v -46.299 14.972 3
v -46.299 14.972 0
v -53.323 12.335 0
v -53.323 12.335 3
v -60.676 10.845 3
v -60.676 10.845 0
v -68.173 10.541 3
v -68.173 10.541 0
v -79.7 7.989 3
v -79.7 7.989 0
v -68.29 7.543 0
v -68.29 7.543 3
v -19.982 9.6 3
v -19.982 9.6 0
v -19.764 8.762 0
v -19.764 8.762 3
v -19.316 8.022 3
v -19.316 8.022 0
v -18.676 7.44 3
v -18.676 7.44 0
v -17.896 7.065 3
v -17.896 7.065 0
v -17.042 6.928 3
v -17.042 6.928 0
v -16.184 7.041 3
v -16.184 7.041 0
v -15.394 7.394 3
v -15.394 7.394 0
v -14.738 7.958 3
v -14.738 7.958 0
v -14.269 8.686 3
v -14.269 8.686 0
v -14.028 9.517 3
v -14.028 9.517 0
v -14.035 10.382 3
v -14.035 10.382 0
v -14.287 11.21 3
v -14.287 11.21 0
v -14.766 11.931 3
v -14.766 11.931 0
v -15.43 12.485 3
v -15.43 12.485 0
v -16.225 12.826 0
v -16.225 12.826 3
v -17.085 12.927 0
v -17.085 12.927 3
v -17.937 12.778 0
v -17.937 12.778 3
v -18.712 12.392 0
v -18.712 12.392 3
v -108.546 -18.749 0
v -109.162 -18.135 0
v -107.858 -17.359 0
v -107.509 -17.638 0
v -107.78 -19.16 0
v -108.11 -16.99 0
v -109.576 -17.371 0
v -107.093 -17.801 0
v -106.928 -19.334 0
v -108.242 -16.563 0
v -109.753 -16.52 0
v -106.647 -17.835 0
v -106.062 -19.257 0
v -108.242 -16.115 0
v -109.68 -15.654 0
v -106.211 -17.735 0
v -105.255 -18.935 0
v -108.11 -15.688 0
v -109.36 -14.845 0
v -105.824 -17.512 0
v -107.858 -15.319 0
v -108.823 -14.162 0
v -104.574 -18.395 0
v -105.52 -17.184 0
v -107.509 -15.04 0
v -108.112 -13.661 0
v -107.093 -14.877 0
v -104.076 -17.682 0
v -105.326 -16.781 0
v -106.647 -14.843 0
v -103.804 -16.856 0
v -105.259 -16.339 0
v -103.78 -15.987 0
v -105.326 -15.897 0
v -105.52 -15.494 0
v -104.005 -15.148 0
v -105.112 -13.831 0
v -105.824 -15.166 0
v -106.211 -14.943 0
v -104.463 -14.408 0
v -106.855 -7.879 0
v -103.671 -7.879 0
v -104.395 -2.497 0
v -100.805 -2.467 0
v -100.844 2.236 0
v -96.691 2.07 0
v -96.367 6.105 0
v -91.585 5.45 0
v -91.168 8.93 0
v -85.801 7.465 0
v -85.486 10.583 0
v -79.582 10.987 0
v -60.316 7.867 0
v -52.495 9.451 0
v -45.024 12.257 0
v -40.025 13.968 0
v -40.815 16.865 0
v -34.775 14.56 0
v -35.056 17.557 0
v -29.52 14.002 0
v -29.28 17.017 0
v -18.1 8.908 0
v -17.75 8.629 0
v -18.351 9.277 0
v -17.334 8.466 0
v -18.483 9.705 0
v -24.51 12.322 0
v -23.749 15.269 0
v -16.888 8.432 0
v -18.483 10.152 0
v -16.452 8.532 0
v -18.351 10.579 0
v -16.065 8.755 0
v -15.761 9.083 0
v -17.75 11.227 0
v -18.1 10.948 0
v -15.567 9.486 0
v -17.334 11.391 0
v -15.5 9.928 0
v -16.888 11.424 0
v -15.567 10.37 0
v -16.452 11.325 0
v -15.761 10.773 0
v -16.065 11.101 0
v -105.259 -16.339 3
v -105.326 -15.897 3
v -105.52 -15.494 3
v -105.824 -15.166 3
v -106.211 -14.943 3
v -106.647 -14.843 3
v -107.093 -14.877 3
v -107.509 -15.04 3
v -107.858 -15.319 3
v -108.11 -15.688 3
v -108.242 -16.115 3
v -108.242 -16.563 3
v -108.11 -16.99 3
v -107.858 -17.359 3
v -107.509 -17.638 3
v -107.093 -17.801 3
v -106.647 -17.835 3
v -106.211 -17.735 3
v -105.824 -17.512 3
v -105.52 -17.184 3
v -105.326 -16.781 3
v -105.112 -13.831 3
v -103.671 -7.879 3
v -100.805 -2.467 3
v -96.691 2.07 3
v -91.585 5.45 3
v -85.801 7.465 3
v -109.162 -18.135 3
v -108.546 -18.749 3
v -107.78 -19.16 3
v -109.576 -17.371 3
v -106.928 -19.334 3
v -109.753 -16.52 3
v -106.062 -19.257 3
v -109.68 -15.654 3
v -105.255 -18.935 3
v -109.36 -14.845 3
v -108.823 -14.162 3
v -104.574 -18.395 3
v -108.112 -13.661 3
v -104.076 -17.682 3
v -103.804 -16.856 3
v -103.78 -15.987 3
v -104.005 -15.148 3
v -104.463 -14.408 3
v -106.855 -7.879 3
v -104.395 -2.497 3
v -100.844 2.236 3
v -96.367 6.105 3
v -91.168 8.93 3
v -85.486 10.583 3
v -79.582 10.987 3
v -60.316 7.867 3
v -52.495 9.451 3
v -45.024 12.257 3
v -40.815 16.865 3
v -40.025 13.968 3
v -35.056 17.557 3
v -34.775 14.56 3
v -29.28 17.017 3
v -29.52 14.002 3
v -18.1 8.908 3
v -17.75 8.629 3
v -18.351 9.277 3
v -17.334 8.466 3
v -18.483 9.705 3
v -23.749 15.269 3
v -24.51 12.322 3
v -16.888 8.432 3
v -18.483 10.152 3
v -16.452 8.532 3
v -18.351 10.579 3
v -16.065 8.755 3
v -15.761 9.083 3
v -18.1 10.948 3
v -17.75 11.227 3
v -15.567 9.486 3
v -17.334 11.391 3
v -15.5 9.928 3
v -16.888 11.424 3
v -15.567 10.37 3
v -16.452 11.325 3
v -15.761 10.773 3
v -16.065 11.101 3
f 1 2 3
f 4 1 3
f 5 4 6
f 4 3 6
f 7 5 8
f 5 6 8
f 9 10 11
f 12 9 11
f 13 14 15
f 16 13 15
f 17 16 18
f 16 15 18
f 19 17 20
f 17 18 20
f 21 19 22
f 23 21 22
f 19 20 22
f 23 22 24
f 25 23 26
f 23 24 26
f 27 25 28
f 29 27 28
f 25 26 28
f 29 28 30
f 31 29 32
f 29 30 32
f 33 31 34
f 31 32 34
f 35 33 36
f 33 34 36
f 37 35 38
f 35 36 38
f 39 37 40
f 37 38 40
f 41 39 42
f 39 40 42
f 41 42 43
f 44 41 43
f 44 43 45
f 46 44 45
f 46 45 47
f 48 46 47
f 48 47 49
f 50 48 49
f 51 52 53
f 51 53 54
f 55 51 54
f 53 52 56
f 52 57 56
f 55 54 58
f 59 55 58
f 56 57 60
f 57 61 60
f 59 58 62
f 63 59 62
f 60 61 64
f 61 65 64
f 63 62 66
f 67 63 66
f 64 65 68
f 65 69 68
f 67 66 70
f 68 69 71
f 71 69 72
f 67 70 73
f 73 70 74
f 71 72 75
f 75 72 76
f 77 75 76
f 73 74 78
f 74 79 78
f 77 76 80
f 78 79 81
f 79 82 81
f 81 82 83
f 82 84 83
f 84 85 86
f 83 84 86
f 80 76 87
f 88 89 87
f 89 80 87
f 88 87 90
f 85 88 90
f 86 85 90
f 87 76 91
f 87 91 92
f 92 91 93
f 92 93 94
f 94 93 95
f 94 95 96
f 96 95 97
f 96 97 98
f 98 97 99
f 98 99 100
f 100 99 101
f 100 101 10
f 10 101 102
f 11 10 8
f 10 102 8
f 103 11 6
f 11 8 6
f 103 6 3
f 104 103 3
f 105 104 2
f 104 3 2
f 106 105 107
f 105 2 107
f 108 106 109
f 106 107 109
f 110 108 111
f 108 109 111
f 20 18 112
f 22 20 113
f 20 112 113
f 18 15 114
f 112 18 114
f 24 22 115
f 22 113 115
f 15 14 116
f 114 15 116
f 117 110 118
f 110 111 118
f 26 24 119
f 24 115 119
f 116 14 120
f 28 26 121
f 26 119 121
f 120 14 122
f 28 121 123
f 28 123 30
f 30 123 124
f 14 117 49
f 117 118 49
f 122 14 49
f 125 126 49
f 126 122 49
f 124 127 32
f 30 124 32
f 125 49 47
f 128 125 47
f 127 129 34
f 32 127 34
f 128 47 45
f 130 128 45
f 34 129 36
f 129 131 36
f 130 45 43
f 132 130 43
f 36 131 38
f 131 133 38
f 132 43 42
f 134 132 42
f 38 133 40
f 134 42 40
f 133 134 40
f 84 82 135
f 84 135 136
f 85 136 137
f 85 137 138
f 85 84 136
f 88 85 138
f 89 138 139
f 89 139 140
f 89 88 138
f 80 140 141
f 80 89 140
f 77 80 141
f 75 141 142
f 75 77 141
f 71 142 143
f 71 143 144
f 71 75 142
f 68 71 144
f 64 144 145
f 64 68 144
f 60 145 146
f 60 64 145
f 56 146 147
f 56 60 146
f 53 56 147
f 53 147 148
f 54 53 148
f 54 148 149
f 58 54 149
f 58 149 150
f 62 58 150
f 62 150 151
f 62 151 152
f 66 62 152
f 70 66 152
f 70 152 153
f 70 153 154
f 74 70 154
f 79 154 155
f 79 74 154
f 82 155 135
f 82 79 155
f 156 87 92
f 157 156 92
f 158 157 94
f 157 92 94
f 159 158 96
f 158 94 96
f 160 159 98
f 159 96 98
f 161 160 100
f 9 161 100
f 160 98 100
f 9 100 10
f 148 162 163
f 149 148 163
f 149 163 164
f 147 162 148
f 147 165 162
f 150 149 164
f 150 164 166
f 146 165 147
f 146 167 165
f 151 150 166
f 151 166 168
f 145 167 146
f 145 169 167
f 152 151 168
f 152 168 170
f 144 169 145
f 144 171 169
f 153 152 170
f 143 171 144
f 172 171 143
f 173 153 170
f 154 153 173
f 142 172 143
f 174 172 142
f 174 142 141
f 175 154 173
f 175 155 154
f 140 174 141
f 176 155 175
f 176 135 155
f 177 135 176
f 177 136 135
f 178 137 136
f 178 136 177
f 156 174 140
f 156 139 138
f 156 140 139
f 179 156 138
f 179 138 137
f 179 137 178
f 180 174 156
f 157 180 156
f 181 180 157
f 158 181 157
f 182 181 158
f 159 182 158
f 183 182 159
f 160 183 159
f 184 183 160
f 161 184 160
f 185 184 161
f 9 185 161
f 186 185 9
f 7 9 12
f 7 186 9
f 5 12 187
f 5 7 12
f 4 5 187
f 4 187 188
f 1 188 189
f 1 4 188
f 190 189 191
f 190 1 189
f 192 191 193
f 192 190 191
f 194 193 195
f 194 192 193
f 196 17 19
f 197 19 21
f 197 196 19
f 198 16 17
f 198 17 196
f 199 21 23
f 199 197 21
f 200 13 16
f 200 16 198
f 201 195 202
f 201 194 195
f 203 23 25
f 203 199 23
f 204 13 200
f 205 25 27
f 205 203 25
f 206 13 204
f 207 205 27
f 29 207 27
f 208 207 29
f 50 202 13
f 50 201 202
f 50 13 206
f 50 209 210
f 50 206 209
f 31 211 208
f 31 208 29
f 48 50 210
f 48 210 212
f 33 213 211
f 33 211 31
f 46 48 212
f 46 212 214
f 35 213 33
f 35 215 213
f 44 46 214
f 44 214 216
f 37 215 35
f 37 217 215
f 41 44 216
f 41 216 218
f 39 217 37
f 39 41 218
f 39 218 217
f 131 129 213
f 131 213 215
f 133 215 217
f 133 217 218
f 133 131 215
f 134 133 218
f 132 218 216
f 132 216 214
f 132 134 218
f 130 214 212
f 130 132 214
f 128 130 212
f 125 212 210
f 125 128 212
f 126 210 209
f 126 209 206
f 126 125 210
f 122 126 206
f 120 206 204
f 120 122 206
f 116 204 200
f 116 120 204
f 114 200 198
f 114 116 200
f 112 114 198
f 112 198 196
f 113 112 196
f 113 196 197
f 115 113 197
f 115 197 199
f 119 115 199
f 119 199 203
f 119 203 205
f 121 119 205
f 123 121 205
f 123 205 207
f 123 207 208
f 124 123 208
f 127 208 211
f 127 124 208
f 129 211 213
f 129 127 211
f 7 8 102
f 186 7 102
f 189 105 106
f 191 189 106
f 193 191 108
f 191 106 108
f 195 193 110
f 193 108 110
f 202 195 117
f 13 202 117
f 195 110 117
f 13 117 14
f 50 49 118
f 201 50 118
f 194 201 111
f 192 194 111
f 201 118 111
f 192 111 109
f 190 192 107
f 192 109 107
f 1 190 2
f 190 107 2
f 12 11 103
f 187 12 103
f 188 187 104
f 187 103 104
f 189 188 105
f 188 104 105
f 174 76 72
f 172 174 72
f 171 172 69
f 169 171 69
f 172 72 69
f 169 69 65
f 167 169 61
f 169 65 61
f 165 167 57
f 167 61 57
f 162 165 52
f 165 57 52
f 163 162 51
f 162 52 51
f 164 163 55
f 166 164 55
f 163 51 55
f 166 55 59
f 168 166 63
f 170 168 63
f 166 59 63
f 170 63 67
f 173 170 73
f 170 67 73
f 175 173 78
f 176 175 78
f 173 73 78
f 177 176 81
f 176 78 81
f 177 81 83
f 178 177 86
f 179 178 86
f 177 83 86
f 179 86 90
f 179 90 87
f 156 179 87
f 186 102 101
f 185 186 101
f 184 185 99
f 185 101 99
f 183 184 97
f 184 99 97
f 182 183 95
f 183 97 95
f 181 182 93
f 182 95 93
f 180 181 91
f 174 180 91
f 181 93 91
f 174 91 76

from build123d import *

# Parameters (mm, degrees)
SKETCH1_R           = 1.5
BOSS_EXTRUDE1_DEPTH = 3


with BuildPart() as part:
    # Sketch1 → Boss-Extrude1 (new body)
    with BuildSketch(Plane.XY):
        with BuildLine():
            ThreePointArc((-105.112423116, -13.831138676), (-96.691314892, 2.069847591), (-79.69956033, 7.989028691))
            Line((-79.69956033, 7.989028691), (-68.289776062, 7.543112506))
            ThreePointArc((-68.289776062, 7.543112506), (-56.37401605, 8.503345495), (-45.024076574, 12.256511885))
            ThreePointArc((-45.024076574, 12.256511885), (-32.132147942, 14.423979547), (-19.981968964, 9.599781095))
            ThreePointArc((-19.981968964, 9.599781095), (-14.269337445, 8.685833715), (-18.71157232, 12.392045797))
            ThreePointArc((-18.71157232, 12.392045797), (-32.153587478, 17.440965919), (-46.2987226, 14.9722581))
            ThreePointArc((-46.2987226, 14.9722581), (-56.969685192, 11.443613896), (-68.172619764, 10.540824034))
            Line((-68.172619764, 10.540824034), (-79.582404032, 10.986740218))
            ThreePointArc((-79.582404032, 10.986740218), (-98.709612397, 4.290845071), (-108.111857285, -13.661394421))
            ThreePointArc((-108.111857285, -13.661394421), (-106.928371833, -19.334178574), (-105.112423116, -13.831138676))
        make_face()
        with Locations((-106.758866773, -16.338971063)):
            Circle(SKETCH1_R, mode=Mode.SUBTRACT)
        with Locations((-17, 9.92820323)):
            Circle(SKETCH1_R, mode=Mode.SUBTRACT)
    extrude(amount=BOSS_EXTRUDE1_DEPTH)


solid = part.part
